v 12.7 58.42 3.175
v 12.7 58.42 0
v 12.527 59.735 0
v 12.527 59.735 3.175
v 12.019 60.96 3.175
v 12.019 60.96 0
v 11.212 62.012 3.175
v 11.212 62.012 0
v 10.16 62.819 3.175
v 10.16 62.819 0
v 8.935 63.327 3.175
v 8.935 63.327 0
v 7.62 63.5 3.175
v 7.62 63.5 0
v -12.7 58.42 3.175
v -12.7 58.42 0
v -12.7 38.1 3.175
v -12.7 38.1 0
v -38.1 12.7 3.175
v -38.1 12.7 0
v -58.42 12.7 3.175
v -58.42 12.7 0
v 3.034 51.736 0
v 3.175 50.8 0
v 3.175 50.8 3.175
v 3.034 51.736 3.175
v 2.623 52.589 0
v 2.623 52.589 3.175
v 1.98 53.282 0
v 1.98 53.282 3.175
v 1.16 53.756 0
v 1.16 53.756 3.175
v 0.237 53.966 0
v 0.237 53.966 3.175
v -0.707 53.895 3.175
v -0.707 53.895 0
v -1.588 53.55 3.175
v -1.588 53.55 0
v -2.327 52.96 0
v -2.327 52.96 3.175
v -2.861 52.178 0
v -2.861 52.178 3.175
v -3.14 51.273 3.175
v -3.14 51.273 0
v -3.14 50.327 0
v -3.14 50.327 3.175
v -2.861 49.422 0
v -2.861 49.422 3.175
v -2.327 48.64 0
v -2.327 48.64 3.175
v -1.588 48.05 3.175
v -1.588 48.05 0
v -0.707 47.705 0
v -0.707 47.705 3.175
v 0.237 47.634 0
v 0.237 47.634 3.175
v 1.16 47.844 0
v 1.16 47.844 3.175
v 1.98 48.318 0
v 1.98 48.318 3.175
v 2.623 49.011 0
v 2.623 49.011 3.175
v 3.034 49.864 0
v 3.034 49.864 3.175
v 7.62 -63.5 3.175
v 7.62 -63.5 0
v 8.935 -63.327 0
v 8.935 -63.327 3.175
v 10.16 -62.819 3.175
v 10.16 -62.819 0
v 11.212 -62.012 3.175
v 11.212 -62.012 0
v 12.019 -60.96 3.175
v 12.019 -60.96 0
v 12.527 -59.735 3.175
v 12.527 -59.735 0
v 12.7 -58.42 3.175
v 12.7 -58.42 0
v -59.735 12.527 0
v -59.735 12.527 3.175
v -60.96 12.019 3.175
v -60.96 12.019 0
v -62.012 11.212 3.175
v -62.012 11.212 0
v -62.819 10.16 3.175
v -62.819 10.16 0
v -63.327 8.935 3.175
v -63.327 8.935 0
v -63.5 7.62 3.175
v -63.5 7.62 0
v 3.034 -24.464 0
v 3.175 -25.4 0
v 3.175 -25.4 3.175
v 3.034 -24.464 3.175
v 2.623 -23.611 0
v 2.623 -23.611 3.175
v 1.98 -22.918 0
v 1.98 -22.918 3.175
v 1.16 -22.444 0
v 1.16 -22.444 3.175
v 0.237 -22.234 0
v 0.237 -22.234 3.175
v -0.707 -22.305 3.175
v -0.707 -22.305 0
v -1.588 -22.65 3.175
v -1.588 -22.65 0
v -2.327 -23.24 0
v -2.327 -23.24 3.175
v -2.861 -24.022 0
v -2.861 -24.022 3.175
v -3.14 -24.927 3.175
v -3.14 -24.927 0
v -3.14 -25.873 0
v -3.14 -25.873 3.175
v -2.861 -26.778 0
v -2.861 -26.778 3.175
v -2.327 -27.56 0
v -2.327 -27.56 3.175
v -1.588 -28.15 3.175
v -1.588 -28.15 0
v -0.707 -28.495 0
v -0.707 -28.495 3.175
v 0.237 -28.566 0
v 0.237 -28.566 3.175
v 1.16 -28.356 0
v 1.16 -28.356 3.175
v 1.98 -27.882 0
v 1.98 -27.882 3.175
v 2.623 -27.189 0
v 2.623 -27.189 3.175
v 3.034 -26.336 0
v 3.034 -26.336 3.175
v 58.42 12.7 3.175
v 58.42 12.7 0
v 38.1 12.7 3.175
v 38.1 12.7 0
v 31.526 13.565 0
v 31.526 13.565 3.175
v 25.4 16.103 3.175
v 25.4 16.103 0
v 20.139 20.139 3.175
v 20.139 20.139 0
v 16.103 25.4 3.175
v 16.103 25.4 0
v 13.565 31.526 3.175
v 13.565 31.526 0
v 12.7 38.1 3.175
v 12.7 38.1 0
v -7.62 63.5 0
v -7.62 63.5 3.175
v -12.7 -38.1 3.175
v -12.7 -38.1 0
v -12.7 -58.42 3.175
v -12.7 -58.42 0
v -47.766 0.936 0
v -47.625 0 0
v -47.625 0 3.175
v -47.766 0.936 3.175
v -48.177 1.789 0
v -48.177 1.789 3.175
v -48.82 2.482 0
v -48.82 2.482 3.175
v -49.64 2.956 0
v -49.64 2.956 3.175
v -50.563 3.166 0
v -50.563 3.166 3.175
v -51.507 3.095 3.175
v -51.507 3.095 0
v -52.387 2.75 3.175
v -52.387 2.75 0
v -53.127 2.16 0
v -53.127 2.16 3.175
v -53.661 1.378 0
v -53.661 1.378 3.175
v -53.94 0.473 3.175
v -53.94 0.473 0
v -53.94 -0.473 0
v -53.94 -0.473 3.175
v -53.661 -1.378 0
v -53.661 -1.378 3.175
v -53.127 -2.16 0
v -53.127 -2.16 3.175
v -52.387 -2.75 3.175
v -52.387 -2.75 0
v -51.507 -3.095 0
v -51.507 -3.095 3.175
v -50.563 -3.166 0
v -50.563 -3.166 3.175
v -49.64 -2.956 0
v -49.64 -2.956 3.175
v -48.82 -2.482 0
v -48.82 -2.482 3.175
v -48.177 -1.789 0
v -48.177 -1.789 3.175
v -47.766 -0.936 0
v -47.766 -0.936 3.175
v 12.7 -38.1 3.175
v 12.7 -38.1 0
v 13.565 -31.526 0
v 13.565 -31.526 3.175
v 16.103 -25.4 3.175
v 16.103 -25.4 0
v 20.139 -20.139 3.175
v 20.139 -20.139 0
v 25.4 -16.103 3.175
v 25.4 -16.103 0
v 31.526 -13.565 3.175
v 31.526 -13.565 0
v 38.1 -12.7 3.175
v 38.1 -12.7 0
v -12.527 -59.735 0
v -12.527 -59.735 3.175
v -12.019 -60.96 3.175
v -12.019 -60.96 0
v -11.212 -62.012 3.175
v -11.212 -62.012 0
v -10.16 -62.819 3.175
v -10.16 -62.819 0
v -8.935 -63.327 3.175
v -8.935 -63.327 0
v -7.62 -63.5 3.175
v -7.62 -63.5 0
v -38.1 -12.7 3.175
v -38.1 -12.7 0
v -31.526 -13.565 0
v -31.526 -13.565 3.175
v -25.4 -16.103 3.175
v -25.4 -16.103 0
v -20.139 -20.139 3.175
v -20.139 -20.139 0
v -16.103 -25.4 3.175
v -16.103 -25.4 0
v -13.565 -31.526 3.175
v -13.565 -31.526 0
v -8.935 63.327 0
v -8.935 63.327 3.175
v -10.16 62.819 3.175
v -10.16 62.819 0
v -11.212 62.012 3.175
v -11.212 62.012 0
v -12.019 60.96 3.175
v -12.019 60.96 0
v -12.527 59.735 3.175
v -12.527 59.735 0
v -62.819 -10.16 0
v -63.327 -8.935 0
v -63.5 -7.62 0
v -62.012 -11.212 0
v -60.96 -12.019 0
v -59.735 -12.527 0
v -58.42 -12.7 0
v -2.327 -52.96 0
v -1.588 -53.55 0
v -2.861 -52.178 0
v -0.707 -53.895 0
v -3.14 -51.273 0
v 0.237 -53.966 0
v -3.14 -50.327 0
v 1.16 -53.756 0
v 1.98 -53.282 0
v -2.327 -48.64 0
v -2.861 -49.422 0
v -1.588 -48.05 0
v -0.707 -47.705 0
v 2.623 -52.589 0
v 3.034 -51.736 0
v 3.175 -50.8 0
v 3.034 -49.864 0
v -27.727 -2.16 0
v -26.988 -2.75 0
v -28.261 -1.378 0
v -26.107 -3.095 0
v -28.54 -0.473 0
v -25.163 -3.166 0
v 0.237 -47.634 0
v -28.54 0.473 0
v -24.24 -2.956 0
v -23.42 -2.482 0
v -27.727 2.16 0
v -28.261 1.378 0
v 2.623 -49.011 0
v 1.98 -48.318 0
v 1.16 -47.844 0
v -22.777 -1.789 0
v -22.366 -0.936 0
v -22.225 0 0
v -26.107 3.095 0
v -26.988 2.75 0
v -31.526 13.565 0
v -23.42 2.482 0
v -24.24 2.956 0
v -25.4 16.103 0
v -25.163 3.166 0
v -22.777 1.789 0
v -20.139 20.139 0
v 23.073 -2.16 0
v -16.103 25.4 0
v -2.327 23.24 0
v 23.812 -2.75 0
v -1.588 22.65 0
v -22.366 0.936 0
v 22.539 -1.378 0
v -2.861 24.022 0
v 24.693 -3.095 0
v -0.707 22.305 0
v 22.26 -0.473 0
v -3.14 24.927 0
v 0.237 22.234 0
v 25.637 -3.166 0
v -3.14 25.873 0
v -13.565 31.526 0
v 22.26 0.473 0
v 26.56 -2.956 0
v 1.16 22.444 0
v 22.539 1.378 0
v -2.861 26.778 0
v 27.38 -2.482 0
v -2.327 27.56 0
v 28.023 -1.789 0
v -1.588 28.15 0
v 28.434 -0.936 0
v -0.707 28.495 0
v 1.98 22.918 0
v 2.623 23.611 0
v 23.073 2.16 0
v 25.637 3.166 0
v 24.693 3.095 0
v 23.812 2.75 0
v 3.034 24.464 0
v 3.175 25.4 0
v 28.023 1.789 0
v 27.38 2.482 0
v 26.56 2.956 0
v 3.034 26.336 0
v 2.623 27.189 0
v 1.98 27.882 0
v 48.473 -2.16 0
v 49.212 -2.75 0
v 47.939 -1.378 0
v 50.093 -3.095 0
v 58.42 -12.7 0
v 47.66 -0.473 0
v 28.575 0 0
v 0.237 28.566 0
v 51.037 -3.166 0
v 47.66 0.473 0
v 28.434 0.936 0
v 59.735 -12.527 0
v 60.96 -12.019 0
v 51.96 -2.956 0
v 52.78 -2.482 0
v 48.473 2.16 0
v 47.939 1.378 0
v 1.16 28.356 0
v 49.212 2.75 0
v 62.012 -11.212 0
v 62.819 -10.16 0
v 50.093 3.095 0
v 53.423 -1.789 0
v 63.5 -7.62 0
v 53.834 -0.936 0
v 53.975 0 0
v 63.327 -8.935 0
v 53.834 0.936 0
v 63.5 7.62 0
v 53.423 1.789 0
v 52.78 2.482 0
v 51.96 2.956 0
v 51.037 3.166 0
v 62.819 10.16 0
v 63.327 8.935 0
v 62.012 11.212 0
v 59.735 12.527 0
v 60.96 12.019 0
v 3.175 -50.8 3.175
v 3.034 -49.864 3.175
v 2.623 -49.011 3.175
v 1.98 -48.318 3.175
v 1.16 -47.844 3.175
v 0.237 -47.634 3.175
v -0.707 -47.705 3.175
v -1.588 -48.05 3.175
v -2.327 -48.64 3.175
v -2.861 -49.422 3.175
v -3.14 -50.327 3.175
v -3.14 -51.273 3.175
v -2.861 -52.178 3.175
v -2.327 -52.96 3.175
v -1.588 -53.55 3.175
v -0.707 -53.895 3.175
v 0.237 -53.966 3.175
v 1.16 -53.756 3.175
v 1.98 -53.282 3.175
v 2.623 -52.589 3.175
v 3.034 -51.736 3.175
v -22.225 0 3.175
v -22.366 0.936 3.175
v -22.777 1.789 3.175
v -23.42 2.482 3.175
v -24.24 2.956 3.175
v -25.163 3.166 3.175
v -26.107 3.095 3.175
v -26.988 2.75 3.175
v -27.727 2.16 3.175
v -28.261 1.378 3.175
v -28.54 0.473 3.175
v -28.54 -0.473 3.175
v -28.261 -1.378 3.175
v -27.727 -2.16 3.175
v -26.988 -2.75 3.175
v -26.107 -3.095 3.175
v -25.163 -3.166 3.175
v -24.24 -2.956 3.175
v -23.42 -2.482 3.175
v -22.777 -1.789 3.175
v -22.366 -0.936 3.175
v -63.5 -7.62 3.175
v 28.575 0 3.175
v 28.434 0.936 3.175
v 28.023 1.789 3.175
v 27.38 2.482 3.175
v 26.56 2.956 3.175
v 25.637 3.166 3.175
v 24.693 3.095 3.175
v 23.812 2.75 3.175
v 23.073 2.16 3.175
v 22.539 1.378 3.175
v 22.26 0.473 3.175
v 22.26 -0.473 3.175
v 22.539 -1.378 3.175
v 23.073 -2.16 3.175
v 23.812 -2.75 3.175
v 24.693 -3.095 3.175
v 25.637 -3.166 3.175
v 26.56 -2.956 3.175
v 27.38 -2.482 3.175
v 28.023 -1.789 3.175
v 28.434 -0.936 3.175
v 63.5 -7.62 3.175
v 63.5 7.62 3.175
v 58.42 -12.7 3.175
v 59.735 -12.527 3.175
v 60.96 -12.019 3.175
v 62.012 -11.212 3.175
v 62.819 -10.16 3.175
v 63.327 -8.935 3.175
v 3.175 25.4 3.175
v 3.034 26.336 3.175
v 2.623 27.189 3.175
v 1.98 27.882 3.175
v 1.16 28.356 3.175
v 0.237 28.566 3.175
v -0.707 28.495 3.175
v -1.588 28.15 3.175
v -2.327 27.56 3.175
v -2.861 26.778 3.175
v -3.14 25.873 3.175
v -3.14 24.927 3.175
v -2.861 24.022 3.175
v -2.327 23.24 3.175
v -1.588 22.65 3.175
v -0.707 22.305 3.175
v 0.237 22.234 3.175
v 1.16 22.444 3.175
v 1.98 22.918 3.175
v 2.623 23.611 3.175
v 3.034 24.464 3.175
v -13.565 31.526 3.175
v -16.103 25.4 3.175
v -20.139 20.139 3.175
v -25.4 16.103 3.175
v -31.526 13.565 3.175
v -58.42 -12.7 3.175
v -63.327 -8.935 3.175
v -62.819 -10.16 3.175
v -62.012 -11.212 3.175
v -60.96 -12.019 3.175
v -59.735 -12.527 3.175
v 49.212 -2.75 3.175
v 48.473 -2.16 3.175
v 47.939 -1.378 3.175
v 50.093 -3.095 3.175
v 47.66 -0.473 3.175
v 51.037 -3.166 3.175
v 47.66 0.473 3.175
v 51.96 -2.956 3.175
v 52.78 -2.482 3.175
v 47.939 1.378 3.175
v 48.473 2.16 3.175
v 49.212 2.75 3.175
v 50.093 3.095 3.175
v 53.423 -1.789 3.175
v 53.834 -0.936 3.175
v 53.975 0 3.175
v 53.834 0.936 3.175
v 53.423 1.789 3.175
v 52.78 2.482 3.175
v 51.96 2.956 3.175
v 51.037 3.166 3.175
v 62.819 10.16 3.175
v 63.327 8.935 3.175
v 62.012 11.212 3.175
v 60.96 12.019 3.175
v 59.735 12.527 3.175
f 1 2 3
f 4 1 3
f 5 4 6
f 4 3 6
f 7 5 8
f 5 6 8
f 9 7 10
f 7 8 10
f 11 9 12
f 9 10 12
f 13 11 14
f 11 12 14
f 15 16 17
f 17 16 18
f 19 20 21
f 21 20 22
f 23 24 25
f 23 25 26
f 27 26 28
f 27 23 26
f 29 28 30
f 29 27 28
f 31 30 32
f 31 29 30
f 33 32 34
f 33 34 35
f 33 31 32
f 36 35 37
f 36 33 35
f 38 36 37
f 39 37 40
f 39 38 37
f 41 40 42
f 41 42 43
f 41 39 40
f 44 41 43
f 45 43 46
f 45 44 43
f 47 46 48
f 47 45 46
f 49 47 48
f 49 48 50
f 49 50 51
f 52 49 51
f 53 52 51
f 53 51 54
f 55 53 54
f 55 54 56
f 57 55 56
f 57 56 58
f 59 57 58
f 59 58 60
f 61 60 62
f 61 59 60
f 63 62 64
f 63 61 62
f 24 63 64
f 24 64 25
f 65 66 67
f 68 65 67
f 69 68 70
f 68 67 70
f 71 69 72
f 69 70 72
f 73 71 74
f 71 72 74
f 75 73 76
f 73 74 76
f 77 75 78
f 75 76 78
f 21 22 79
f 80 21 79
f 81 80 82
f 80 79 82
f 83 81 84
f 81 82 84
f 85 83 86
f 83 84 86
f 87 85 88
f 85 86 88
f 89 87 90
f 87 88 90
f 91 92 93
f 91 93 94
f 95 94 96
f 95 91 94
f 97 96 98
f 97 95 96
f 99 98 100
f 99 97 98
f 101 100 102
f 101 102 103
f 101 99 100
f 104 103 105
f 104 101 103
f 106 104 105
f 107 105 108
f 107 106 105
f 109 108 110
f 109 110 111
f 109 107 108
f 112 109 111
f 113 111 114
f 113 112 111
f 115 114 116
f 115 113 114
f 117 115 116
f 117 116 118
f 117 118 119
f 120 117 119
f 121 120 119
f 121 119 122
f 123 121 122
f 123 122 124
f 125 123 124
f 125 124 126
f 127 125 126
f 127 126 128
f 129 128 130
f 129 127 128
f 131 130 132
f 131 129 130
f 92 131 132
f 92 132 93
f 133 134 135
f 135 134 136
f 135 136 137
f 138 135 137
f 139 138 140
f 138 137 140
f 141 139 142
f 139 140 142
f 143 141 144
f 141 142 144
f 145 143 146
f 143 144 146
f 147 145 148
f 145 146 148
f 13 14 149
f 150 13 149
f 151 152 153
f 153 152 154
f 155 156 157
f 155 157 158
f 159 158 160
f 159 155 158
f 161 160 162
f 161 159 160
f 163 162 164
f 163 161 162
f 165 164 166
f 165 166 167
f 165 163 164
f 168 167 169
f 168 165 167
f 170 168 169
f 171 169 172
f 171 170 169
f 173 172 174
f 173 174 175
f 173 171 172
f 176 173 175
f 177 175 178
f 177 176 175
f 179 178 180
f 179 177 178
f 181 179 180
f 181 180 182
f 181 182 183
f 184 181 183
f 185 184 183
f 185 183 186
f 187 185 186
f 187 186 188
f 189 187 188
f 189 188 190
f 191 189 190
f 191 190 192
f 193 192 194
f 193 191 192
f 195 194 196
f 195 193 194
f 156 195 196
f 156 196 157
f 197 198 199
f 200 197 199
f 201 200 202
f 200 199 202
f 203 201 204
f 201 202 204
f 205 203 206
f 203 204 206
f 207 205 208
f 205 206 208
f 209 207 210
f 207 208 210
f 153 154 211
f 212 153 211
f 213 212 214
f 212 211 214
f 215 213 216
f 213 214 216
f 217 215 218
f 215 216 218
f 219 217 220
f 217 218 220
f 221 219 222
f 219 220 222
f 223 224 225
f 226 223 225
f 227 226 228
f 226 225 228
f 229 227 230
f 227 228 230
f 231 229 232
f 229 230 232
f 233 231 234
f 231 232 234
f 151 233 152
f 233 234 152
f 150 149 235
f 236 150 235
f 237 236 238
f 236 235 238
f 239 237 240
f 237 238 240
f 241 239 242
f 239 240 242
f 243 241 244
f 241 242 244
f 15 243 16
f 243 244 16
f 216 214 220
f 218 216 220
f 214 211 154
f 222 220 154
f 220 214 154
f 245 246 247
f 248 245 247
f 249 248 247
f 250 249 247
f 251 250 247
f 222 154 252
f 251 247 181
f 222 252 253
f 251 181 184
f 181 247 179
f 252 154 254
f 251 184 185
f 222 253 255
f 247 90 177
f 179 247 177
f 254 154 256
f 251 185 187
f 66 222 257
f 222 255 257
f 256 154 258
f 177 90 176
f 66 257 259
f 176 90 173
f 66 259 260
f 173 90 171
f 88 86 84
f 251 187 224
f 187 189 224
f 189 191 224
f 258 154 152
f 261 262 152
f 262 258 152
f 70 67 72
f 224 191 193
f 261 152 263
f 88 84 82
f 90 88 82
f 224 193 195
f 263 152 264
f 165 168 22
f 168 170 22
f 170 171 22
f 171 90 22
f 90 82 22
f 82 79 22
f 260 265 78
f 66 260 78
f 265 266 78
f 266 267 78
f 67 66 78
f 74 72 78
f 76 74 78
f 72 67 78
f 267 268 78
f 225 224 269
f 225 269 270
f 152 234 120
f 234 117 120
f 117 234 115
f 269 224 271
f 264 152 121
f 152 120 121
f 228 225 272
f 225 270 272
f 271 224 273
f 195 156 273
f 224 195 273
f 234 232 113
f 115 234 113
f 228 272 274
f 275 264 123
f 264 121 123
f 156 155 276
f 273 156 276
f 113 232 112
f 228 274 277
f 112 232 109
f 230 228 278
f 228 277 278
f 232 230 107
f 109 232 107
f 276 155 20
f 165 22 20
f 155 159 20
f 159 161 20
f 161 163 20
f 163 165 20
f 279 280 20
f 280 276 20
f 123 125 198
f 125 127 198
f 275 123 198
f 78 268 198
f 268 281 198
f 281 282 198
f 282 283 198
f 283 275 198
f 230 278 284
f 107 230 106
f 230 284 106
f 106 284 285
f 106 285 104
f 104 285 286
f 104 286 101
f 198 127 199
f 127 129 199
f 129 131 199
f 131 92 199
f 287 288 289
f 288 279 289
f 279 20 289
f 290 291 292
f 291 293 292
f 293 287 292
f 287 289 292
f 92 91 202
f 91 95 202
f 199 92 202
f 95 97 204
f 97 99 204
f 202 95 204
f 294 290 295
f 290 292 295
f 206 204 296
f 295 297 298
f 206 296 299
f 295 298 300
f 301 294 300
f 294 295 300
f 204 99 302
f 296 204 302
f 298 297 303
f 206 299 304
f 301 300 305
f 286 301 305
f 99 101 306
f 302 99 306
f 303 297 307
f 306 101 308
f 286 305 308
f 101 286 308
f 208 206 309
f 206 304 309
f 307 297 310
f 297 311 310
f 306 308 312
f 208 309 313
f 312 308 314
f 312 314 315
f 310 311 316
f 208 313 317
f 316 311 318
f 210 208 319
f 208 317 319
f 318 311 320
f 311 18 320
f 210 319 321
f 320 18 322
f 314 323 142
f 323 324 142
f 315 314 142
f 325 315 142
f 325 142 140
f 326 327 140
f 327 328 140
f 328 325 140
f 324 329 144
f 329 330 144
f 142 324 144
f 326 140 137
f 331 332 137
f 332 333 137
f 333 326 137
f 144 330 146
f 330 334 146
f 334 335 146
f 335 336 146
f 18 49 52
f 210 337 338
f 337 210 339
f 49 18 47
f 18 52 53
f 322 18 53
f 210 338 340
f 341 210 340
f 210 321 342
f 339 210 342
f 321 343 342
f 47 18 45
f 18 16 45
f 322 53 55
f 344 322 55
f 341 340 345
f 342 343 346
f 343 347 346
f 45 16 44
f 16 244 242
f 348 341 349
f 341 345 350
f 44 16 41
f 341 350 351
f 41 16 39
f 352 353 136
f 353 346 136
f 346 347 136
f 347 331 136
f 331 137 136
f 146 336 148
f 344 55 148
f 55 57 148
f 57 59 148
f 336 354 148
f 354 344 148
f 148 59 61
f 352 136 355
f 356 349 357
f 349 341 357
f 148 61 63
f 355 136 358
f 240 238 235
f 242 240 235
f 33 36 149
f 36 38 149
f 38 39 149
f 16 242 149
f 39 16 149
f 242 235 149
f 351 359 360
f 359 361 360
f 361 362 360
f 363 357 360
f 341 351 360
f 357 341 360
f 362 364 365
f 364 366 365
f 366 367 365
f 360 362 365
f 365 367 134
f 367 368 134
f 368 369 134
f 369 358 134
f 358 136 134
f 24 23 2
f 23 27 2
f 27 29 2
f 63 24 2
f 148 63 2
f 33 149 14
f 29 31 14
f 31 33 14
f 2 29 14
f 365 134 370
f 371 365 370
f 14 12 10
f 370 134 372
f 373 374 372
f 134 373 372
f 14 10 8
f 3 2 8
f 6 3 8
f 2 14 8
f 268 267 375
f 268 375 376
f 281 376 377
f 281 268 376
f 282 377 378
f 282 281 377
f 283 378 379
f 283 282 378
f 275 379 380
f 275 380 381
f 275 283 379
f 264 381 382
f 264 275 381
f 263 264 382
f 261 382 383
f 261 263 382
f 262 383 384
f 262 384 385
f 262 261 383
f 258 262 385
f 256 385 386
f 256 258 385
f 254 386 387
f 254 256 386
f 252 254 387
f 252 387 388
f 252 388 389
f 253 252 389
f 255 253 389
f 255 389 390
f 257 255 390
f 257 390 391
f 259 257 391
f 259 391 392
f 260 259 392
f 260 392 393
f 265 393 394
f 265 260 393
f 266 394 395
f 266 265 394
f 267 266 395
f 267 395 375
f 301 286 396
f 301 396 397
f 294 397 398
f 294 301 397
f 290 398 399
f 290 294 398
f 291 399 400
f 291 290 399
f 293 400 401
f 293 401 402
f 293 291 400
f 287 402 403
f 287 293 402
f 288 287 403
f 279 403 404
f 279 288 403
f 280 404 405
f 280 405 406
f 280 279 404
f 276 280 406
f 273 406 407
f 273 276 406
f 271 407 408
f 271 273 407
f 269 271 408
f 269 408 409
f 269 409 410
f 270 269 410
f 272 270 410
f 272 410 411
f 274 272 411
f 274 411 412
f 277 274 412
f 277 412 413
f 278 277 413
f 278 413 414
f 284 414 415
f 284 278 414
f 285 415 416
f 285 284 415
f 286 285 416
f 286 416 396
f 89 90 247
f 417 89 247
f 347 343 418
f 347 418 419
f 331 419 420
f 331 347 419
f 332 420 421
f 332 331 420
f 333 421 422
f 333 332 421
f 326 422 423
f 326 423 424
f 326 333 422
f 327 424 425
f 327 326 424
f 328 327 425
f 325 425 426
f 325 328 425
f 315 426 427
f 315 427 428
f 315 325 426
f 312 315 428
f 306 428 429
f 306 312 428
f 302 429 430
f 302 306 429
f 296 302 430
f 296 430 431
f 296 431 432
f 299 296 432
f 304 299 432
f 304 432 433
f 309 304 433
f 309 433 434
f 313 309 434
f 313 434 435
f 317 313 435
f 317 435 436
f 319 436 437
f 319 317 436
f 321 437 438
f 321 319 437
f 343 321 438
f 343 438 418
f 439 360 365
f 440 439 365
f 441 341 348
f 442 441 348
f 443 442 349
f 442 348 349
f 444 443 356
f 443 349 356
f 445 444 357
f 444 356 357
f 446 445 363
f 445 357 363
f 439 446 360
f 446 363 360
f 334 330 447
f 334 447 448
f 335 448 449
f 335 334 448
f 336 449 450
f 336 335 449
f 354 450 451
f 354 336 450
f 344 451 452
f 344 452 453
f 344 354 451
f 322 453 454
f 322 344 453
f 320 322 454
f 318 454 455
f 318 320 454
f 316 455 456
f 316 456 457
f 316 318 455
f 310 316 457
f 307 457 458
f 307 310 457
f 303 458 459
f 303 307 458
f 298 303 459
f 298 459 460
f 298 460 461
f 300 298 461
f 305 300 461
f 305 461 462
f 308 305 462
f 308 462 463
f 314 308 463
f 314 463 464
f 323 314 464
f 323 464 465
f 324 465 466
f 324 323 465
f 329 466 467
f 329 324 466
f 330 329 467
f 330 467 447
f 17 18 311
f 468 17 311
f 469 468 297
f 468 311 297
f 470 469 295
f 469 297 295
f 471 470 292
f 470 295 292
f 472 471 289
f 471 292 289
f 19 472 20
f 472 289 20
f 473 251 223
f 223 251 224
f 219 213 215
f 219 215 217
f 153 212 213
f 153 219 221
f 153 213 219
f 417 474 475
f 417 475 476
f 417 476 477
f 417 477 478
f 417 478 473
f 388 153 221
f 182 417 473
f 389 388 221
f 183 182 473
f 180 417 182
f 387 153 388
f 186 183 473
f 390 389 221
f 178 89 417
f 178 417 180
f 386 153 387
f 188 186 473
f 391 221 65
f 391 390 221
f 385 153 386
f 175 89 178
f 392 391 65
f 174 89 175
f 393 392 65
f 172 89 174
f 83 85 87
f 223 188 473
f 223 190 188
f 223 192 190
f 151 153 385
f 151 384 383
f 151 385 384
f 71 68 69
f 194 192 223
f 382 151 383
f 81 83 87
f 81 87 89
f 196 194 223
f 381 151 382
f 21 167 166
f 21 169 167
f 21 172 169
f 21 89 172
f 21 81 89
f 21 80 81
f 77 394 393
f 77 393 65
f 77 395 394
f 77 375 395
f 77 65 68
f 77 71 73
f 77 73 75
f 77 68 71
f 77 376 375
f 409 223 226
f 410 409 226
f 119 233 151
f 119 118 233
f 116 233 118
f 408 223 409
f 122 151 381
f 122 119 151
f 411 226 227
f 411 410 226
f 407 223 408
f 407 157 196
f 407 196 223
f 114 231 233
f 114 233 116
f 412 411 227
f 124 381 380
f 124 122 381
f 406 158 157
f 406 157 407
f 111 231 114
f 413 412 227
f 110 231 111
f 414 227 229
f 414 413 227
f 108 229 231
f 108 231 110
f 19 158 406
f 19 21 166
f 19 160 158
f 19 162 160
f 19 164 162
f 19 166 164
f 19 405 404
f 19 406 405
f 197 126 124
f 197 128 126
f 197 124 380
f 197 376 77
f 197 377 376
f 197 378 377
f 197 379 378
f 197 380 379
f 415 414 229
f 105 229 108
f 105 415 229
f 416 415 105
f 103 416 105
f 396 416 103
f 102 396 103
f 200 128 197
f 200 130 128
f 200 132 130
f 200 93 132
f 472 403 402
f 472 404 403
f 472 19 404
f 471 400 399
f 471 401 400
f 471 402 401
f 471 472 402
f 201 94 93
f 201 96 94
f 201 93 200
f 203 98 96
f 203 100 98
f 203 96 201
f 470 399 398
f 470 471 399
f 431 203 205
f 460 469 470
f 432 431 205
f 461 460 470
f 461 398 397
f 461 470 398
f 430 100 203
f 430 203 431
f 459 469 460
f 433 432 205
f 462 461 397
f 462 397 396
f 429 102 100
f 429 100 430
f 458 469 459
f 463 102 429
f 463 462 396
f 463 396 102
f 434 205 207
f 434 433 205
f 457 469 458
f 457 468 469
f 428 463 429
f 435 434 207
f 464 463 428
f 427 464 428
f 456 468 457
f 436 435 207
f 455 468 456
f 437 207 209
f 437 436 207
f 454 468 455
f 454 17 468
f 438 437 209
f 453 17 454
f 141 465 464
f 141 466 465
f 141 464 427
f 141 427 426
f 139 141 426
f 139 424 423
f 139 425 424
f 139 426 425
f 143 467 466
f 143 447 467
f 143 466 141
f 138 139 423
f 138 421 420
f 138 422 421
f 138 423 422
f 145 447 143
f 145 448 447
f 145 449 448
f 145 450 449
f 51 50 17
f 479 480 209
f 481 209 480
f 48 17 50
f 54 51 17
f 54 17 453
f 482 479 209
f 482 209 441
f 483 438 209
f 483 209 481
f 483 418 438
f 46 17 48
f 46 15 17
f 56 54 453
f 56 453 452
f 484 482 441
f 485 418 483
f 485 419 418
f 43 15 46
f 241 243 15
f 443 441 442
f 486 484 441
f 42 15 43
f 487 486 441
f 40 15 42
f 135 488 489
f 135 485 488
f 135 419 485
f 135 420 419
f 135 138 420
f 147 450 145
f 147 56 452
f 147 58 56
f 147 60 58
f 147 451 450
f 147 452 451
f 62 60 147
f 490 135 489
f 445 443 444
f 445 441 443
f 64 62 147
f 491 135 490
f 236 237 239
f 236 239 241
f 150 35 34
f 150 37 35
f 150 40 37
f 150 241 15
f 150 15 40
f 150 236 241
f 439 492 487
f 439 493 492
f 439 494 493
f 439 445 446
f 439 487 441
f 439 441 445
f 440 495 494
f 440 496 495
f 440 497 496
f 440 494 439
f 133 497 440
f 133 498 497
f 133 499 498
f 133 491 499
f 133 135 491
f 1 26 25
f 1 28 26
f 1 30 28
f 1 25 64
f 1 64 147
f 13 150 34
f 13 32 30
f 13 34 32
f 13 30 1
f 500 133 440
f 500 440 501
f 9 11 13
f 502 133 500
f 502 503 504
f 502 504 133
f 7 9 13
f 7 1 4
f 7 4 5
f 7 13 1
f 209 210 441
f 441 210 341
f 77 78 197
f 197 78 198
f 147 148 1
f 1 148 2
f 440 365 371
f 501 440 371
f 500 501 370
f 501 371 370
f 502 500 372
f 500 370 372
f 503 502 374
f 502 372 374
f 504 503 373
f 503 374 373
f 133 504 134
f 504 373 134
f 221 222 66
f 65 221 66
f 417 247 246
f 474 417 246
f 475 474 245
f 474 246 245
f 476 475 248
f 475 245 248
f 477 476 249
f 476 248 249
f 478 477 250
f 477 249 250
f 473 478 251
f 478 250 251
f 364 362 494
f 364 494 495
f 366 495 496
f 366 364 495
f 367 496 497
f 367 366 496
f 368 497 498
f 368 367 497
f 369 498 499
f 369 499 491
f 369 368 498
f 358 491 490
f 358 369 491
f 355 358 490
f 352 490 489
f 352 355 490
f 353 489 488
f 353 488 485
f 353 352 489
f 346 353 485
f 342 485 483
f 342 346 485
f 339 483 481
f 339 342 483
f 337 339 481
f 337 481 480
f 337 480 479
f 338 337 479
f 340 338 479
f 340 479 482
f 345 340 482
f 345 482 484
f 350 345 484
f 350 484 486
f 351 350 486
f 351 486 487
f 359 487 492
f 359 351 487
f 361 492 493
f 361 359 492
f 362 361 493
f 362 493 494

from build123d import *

# Parameters (mm, degrees)
F0_R     = 3.175
F1_DEPTH = 3.175


# Not quite as in the source:
# - a length typed as a fraction of an inch, garbled in the dataset ("3 / 203.2 mm" for 3/8 in), is restored


with BuildPart() as f1:
    # F0 (on Top) → F1 (new body)
    with BuildSketch(Plane.XY):
        with BuildLine():
            ThreePointArc((-63.5, -7.62), (-62.0121024484, -11.2121024484), (-58.42, -12.7))
            Line((-58.42, -12.7), (-38.1, -12.7))
            ThreePointArc((-38.1, -12.7), (-20.1394877579, -20.1394877579), (-12.7, -38.1))
            Line((-12.7, -38.1), (-12.7, -58.42))
            ThreePointArc((-12.7, -58.42), (-11.2121024484, -62.0121024484), (-7.62, -63.5))
            Line((-7.62, -63.5), (0, -63.5))
            Line((0, -63.5), (7.62, -63.5))
            ThreePointArc((7.62, -63.5), (11.2121024484, -62.0121024484), (12.7, -58.42))
            Line((12.7, -58.42), (12.7, -38.1))
            ThreePointArc((12.7, -38.1), (20.1394877579, -20.1394877579), (38.1, -12.7))
            Line((38.1, -12.7), (58.42, -12.7))
            ThreePointArc((58.42, -12.7), (62.0121024484, -11.2121024484), (63.5, -7.62))
            Line((63.5, -7.62), (63.5, 0))
            Line((63.5, 0), (63.5, 7.62))
            ThreePointArc((63.5, 7.62), (62.0121024484, 11.2121024484), (58.42, 12.7))
            Line((58.42, 12.7), (38.1, 12.7))
            ThreePointArc((38.1, 12.7), (20.1394877579, 20.1394877579), (12.7, 38.1))
            Line((12.7, 38.1), (12.7, 58.42))
            ThreePointArc((12.7, 58.42), (11.2121024484, 62.0121024484), (7.62, 63.5))
            Line((7.62, 63.5), (-7.62, 63.5))
            ThreePointArc((-7.62, 63.5), (-11.2121024484, 62.0121024484), (-12.7, 58.42))
            Line((-12.7, 58.42), (-12.7, 38.1))
            ThreePointArc((-12.7, 38.1), (-20.1394877579, 20.1394877579), (-38.1, 12.7))
            Line((-38.1, 12.7), (-58.42, 12.7))
            ThreePointArc((-58.42, 12.7), (-62.0121024484, 11.2121024484), (-63.5, 7.62))
            Line((-63.5, 7.62), (-63.5, 0))
            Line((-63.5, 0), (-63.5, -7.62))
        make_face()
        with Locations((0, -50.8)):
            Circle(F0_R, mode=Mode.SUBTRACT)
        with Locations((0, -25.4)):
            Circle(F0_R, mode=Mode.SUBTRACT)
        with Locations((-50.8, 0)):
            Circle(F0_R, mode=Mode.SUBTRACT)
        with Locations((-25.4, 0)):
            Circle(F0_R, mode=Mode.SUBTRACT)
        with Locations((25.4, 0)):
            Circle(F0_R, mode=Mode.SUBTRACT)
        with Locations((0, 25.4)):
            Circle(F0_R, mode=Mode.SUBTRACT)
        with Locations((50.8, 0)):
            Circle(F0_R, mode=Mode.SUBTRACT)
        with Locations((0, 50.8)):
            Circle(F0_R, mode=Mode.SUBTRACT)
    extrude(amount=F1_DEPTH)


solid = f1.part
